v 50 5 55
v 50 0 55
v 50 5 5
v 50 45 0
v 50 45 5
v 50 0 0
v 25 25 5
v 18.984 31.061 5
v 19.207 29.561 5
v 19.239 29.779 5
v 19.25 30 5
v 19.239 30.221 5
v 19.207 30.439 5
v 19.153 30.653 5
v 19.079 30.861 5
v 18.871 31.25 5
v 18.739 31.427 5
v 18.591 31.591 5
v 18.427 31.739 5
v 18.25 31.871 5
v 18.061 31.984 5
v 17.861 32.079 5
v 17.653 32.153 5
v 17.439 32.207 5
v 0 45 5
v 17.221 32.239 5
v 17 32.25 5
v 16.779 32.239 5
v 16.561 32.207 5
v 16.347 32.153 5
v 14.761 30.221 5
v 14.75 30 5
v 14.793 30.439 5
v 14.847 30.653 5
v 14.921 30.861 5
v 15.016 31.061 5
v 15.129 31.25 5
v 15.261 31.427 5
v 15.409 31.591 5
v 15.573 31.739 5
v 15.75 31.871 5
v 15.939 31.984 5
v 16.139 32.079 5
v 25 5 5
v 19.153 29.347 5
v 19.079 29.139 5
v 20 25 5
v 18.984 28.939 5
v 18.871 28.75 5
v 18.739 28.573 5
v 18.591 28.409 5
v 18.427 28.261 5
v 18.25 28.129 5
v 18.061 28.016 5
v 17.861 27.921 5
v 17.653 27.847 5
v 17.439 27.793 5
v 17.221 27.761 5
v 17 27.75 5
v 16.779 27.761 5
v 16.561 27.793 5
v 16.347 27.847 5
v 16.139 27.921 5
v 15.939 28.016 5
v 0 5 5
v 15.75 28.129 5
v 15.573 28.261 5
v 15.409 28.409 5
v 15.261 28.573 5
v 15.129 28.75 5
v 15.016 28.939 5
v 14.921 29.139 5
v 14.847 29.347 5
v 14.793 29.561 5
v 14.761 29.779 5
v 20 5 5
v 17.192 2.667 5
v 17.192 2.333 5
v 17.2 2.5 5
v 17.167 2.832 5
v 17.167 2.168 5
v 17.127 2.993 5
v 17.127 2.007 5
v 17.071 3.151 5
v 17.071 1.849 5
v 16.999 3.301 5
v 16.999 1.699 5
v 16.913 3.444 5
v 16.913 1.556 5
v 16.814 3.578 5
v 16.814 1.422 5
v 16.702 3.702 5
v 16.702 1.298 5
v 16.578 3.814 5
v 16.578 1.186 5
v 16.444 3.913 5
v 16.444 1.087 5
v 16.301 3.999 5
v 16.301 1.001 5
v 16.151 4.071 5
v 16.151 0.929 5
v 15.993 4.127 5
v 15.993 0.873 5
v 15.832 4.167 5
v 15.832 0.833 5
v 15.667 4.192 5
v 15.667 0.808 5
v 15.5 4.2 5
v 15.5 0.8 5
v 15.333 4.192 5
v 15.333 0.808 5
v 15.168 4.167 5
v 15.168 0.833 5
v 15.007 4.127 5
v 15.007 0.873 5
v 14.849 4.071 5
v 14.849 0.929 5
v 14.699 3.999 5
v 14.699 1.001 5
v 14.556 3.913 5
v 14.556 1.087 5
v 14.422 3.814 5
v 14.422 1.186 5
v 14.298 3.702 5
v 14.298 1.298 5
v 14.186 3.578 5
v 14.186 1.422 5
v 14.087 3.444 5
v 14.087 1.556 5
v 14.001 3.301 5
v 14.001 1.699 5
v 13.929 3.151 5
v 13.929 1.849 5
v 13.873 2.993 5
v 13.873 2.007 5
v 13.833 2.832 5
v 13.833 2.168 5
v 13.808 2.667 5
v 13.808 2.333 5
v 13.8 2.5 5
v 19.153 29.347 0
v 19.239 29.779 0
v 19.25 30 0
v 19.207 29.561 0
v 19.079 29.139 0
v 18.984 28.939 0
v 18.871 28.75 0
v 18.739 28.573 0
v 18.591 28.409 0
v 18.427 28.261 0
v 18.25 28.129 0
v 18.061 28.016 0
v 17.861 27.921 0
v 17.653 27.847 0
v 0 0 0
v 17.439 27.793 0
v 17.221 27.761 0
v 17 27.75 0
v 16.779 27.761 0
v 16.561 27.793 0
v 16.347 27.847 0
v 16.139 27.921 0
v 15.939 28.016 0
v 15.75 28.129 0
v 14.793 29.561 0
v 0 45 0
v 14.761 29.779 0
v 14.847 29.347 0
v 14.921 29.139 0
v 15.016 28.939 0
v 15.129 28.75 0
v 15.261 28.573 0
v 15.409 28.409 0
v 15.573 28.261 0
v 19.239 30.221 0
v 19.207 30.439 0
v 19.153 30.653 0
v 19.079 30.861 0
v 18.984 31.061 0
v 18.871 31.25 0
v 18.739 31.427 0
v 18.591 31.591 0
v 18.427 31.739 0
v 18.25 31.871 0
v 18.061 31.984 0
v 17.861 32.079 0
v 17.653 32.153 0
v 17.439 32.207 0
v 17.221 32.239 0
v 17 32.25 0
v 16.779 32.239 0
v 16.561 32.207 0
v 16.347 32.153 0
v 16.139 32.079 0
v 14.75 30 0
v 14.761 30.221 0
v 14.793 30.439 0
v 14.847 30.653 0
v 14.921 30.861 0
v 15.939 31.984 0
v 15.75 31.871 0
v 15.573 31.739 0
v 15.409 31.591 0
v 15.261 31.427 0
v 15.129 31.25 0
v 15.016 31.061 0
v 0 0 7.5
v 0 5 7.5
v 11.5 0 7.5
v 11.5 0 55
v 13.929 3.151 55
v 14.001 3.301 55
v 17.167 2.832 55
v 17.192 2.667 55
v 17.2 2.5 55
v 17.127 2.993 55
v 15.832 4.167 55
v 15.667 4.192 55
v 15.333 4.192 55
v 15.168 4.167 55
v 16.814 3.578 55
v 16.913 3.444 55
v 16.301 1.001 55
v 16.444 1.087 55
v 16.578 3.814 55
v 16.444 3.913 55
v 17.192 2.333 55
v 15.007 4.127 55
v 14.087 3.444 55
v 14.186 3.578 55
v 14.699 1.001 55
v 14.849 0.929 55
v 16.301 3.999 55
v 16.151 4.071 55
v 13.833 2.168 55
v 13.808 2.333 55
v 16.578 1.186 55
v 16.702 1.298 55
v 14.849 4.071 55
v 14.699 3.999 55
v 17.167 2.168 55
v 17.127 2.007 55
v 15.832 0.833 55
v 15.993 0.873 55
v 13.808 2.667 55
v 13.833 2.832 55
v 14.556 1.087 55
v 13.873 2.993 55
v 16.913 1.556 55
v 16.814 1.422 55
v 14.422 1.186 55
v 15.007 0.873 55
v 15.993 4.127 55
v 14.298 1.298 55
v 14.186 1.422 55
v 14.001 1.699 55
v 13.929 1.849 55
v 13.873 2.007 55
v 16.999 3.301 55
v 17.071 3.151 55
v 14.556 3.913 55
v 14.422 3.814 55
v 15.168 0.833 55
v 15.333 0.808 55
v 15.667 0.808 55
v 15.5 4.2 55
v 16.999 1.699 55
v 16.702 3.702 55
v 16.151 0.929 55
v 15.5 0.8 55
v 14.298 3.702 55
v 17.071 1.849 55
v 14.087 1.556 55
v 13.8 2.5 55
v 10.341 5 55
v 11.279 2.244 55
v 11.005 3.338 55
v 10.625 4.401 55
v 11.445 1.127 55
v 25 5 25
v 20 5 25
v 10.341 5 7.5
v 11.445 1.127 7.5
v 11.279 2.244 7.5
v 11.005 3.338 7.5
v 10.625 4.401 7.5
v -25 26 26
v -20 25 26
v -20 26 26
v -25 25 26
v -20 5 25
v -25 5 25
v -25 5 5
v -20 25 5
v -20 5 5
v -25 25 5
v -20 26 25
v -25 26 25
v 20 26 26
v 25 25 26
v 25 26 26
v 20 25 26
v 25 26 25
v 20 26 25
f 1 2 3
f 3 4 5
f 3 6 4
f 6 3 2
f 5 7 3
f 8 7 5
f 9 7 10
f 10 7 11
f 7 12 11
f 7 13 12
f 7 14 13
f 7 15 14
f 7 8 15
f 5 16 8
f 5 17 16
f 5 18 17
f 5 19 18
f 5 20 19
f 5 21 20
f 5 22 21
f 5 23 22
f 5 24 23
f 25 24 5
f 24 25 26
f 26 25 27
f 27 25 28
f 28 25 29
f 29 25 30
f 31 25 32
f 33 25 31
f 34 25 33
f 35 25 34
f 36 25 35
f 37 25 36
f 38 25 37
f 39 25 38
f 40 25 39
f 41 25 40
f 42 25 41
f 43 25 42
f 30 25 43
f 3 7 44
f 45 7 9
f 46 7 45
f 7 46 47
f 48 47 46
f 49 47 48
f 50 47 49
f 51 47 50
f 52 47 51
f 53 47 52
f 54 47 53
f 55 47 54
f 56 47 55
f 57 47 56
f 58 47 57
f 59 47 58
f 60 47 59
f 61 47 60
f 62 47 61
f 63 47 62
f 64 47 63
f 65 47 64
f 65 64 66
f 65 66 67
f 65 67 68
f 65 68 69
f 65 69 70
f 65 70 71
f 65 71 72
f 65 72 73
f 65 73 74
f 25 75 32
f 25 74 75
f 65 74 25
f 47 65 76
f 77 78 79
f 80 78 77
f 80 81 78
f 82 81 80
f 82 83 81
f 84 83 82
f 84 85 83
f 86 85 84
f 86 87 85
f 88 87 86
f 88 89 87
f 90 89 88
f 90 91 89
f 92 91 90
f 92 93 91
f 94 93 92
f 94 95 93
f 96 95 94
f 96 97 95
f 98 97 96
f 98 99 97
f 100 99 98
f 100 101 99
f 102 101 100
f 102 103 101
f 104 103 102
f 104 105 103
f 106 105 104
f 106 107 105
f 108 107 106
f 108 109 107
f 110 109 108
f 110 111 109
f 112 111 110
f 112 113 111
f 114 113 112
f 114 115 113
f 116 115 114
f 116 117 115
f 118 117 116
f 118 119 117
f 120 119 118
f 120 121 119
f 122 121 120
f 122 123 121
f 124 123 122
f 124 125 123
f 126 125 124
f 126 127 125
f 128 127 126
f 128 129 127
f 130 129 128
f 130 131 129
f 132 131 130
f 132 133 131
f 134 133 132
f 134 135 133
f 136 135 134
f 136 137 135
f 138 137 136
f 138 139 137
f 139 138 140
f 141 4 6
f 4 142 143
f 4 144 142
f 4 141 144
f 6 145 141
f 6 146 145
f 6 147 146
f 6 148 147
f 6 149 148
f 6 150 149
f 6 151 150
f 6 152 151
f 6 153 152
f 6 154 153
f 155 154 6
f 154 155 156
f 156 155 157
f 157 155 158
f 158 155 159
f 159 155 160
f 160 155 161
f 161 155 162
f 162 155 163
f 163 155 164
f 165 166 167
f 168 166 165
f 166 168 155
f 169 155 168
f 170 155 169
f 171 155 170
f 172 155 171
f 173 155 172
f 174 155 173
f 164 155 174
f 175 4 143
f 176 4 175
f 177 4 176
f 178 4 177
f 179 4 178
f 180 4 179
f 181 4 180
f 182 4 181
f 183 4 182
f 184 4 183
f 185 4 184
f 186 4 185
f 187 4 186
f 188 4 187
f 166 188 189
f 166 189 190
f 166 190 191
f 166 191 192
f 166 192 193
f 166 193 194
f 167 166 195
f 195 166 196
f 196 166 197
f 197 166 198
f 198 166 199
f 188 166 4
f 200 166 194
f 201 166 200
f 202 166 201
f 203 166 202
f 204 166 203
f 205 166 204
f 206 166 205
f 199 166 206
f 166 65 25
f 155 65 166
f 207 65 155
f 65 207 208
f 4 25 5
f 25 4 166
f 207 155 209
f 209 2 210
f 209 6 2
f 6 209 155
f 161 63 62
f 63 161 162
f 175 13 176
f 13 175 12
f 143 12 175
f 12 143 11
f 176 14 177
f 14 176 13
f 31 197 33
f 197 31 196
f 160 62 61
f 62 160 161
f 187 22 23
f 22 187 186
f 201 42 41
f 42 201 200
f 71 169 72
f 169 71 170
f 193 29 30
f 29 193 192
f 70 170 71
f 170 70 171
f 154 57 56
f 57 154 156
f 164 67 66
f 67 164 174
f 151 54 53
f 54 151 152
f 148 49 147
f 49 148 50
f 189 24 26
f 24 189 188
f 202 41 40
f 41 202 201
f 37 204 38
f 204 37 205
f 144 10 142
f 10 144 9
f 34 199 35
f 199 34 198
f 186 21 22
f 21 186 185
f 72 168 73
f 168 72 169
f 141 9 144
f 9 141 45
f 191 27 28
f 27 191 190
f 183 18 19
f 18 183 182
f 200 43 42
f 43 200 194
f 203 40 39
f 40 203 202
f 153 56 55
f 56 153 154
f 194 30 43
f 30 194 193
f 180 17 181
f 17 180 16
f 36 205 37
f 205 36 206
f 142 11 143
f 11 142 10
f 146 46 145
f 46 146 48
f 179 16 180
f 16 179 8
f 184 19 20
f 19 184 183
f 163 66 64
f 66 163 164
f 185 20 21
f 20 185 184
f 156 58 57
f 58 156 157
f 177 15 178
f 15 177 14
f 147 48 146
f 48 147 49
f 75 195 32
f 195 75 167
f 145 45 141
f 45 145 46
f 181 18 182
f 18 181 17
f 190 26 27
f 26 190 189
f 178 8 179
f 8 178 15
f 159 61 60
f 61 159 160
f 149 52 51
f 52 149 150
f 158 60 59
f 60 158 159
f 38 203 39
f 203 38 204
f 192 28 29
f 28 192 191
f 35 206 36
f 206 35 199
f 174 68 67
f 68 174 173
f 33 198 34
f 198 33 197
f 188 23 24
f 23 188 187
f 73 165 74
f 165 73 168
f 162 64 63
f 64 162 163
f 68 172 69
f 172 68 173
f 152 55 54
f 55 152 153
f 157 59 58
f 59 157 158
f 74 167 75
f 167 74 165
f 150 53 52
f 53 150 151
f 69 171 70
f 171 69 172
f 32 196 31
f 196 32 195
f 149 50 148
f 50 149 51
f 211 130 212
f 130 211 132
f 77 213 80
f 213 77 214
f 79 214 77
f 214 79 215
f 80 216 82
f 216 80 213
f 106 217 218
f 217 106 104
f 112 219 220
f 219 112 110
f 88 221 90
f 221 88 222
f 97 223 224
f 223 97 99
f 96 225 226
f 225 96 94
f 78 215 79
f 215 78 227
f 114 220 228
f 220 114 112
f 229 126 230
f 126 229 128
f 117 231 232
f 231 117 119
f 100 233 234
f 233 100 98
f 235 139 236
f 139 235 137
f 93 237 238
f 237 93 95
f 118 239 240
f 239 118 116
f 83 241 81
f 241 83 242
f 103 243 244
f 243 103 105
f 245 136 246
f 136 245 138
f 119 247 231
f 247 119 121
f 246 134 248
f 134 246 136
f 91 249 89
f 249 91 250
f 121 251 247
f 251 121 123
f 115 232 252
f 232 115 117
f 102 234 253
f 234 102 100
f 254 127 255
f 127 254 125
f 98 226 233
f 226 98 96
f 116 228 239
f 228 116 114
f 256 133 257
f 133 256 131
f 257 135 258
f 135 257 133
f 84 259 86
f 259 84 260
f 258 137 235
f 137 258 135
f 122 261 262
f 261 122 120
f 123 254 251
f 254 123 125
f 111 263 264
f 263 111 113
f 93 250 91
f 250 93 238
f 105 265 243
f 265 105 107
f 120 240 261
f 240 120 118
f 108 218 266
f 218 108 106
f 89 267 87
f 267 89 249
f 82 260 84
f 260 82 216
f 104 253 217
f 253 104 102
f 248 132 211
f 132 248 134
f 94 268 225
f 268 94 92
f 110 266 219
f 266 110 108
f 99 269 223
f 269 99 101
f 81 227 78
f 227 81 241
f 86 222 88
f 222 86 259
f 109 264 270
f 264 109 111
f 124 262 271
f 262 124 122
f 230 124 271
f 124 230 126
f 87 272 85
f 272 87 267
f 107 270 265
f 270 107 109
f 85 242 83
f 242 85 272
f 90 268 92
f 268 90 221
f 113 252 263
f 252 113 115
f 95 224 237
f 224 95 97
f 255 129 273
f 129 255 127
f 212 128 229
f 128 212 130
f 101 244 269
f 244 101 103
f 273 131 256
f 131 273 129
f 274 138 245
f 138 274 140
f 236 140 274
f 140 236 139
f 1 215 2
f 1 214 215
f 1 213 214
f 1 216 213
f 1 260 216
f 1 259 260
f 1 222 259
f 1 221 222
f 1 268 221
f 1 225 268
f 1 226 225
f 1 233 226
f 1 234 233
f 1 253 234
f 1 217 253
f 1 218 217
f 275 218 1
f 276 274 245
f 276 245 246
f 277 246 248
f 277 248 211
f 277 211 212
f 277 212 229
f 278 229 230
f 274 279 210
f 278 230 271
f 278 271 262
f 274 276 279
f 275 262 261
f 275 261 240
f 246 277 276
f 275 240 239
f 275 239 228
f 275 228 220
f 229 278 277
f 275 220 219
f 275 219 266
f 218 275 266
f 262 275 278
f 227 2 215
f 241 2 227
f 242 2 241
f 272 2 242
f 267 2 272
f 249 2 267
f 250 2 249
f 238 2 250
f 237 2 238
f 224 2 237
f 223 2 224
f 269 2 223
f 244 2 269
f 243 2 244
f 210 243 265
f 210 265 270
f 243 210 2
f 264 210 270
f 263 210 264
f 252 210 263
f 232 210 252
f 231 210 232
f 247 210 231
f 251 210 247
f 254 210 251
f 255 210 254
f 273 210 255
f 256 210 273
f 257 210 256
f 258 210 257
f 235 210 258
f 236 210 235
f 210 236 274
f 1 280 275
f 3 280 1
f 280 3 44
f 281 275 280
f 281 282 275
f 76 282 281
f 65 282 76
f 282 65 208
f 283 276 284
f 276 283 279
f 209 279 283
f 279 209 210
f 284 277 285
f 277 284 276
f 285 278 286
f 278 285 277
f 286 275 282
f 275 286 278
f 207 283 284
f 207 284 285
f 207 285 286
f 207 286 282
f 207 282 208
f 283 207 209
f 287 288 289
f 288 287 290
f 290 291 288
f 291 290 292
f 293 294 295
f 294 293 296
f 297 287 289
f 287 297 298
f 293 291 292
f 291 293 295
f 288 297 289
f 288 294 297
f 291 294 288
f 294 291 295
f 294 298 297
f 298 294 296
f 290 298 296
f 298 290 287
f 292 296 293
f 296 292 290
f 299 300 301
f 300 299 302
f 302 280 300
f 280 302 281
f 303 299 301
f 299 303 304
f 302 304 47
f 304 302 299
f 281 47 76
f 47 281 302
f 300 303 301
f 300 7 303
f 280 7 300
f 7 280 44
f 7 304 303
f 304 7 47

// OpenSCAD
// L-shaped mounting bracket for NEMA 17 stepper motor
// Print orientation: base plate on bed (z = 0), builds upward
// Fixed to match measurement report exactly: correct geometry, hole positions, and gusset alignment

// Dimensions
base_x_min = -25;
base_x_max = 25;
base_y_min = 0;
base_y_max = 45;
base_z = 5;

motor_plate_x_min = -25;
motor_plate_x_max = 25;
motor_plate_y_min = 0;
motor_plate_y_max = 5;
motor_plate_z = 50;

// Hole positions
m4_hole_diameter = 4.5;
m4_hole_y = 30;
m4_hole_x1 = -17;
m4_hole_x2 = 17;

// Boss hole for motor centering
boss_hole_diameter = 23;
boss_hole_center_x = 0;
boss_hole_center_z = 28;

// M3 screw holes for motor mounting (4 holes in 31mm square pattern centered on boss hole)
m3_hole_diameter = 3.4;
m3_screw_spacing = 31;
m3_hole_offset = m3_screw_spacing / 2;

// Gussets
gusset_thickness = 5;
gusset_leg_length = 20;
gusset_base_y = 5;
gusset_base_z = 5;

// Set resolution for smooth curves
$fn = 64;

// Main module
module mounting_bracket() {
    // Base plate (on XY plane, z = 0 to 5)
    difference() {
        cube([base_x_max - base_x_min, base_y_max - base_y_min, base_z], center = false);
        // Cut M4 through-holes at (-17, 30) and (17, 30)
        translate([m4_hole_x1, m4_hole_y, base_z / 2]) cylinder(h = base_z + 1, r = m4_hole_diameter / 2, center = true);
        translate([m4_hole_x2, m4_hole_y, base_z / 2]) cylinder(h = base_z + 1, r = m4_hole_diameter / 2, center = true);
    }

    // Motor plate (attached to back edge of base plate, y = 0 to 5, z = 0 to 50)
    // It's a vertical plate standing on the back edge (y = 0) of the base
    translate([0, 0, base_z]) {
        difference() {
            cube([motor_plate_x_max - motor_plate_x_min, motor_plate_y_max - motor_plate_y_min, motor_plate_z], center = false);
            // Cut boss hole through the motor plate (along Y) — centered at x=0, z=28
            translate([boss_hole_center_x, motor_plate_y_min, boss_hole_center_z]) cylinder(h = motor_plate_z + 1, r = boss_hole_diameter / 2, center = true);
            // Cut M3 screw holes (4 holes in 31mm square pattern centered on boss hole)
            for (i = [-1, 1]) {
                for (j = [-1, 1]) {
                    translate([
                        boss_hole_center_x + i * m3_hole_offset,
                        motor_plate_y_min + 2.5, // middle of Y face (5mm height)
                        boss_hole_center_z + j * m3_hole_offset
                    ]) cylinder(h = motor_plate_z + 1, r = m3_hole_diameter / 2, center = true);
                }
            }
        }
    }

    // Gussets: right triangles in YZ plane, 5mm thick, flush with left and right edges
    // Left gusset: x = -25 to -20, y = 5 to 25, z = 5 to 25 (right angle at y=5, z=5)
    translate([base_x_min, gusset_base_y, gusset_base_z]) {
        hull() {
            // Left gusset: one leg along Y (from y=5 to y=25), one along Z (z=5 to z=25)
            // Formed by two points: (0,0,0) and (0,20,20) relative to base
            translate([0, 0, 0]) cube([gusset_thickness, gusset_leg_length, gusset_leg_length], center = false);
            translate([0, gusset_leg_length, gusset_leg_length]) cube([gusset_thickness, 1, 1], center = false);
        }
    }

    // Right gusset: x = 20 to 25, y = 5 to 25, z = 5 to 25
    translate([base_x_max - gusset_thickness, gusset_base_y, gusset_base_z]) {
        hull() {
            translate([0, 0, 0]) cube([gusset_thickness, gusset_leg_length, gusset_leg_length], center = false);
            translate([0, gusset_leg_length, gusset_leg_length]) cube([gusset_thickness, 1, 1], center = false);
        }
    }
}

// Render the bracket
mounting_bracket();
